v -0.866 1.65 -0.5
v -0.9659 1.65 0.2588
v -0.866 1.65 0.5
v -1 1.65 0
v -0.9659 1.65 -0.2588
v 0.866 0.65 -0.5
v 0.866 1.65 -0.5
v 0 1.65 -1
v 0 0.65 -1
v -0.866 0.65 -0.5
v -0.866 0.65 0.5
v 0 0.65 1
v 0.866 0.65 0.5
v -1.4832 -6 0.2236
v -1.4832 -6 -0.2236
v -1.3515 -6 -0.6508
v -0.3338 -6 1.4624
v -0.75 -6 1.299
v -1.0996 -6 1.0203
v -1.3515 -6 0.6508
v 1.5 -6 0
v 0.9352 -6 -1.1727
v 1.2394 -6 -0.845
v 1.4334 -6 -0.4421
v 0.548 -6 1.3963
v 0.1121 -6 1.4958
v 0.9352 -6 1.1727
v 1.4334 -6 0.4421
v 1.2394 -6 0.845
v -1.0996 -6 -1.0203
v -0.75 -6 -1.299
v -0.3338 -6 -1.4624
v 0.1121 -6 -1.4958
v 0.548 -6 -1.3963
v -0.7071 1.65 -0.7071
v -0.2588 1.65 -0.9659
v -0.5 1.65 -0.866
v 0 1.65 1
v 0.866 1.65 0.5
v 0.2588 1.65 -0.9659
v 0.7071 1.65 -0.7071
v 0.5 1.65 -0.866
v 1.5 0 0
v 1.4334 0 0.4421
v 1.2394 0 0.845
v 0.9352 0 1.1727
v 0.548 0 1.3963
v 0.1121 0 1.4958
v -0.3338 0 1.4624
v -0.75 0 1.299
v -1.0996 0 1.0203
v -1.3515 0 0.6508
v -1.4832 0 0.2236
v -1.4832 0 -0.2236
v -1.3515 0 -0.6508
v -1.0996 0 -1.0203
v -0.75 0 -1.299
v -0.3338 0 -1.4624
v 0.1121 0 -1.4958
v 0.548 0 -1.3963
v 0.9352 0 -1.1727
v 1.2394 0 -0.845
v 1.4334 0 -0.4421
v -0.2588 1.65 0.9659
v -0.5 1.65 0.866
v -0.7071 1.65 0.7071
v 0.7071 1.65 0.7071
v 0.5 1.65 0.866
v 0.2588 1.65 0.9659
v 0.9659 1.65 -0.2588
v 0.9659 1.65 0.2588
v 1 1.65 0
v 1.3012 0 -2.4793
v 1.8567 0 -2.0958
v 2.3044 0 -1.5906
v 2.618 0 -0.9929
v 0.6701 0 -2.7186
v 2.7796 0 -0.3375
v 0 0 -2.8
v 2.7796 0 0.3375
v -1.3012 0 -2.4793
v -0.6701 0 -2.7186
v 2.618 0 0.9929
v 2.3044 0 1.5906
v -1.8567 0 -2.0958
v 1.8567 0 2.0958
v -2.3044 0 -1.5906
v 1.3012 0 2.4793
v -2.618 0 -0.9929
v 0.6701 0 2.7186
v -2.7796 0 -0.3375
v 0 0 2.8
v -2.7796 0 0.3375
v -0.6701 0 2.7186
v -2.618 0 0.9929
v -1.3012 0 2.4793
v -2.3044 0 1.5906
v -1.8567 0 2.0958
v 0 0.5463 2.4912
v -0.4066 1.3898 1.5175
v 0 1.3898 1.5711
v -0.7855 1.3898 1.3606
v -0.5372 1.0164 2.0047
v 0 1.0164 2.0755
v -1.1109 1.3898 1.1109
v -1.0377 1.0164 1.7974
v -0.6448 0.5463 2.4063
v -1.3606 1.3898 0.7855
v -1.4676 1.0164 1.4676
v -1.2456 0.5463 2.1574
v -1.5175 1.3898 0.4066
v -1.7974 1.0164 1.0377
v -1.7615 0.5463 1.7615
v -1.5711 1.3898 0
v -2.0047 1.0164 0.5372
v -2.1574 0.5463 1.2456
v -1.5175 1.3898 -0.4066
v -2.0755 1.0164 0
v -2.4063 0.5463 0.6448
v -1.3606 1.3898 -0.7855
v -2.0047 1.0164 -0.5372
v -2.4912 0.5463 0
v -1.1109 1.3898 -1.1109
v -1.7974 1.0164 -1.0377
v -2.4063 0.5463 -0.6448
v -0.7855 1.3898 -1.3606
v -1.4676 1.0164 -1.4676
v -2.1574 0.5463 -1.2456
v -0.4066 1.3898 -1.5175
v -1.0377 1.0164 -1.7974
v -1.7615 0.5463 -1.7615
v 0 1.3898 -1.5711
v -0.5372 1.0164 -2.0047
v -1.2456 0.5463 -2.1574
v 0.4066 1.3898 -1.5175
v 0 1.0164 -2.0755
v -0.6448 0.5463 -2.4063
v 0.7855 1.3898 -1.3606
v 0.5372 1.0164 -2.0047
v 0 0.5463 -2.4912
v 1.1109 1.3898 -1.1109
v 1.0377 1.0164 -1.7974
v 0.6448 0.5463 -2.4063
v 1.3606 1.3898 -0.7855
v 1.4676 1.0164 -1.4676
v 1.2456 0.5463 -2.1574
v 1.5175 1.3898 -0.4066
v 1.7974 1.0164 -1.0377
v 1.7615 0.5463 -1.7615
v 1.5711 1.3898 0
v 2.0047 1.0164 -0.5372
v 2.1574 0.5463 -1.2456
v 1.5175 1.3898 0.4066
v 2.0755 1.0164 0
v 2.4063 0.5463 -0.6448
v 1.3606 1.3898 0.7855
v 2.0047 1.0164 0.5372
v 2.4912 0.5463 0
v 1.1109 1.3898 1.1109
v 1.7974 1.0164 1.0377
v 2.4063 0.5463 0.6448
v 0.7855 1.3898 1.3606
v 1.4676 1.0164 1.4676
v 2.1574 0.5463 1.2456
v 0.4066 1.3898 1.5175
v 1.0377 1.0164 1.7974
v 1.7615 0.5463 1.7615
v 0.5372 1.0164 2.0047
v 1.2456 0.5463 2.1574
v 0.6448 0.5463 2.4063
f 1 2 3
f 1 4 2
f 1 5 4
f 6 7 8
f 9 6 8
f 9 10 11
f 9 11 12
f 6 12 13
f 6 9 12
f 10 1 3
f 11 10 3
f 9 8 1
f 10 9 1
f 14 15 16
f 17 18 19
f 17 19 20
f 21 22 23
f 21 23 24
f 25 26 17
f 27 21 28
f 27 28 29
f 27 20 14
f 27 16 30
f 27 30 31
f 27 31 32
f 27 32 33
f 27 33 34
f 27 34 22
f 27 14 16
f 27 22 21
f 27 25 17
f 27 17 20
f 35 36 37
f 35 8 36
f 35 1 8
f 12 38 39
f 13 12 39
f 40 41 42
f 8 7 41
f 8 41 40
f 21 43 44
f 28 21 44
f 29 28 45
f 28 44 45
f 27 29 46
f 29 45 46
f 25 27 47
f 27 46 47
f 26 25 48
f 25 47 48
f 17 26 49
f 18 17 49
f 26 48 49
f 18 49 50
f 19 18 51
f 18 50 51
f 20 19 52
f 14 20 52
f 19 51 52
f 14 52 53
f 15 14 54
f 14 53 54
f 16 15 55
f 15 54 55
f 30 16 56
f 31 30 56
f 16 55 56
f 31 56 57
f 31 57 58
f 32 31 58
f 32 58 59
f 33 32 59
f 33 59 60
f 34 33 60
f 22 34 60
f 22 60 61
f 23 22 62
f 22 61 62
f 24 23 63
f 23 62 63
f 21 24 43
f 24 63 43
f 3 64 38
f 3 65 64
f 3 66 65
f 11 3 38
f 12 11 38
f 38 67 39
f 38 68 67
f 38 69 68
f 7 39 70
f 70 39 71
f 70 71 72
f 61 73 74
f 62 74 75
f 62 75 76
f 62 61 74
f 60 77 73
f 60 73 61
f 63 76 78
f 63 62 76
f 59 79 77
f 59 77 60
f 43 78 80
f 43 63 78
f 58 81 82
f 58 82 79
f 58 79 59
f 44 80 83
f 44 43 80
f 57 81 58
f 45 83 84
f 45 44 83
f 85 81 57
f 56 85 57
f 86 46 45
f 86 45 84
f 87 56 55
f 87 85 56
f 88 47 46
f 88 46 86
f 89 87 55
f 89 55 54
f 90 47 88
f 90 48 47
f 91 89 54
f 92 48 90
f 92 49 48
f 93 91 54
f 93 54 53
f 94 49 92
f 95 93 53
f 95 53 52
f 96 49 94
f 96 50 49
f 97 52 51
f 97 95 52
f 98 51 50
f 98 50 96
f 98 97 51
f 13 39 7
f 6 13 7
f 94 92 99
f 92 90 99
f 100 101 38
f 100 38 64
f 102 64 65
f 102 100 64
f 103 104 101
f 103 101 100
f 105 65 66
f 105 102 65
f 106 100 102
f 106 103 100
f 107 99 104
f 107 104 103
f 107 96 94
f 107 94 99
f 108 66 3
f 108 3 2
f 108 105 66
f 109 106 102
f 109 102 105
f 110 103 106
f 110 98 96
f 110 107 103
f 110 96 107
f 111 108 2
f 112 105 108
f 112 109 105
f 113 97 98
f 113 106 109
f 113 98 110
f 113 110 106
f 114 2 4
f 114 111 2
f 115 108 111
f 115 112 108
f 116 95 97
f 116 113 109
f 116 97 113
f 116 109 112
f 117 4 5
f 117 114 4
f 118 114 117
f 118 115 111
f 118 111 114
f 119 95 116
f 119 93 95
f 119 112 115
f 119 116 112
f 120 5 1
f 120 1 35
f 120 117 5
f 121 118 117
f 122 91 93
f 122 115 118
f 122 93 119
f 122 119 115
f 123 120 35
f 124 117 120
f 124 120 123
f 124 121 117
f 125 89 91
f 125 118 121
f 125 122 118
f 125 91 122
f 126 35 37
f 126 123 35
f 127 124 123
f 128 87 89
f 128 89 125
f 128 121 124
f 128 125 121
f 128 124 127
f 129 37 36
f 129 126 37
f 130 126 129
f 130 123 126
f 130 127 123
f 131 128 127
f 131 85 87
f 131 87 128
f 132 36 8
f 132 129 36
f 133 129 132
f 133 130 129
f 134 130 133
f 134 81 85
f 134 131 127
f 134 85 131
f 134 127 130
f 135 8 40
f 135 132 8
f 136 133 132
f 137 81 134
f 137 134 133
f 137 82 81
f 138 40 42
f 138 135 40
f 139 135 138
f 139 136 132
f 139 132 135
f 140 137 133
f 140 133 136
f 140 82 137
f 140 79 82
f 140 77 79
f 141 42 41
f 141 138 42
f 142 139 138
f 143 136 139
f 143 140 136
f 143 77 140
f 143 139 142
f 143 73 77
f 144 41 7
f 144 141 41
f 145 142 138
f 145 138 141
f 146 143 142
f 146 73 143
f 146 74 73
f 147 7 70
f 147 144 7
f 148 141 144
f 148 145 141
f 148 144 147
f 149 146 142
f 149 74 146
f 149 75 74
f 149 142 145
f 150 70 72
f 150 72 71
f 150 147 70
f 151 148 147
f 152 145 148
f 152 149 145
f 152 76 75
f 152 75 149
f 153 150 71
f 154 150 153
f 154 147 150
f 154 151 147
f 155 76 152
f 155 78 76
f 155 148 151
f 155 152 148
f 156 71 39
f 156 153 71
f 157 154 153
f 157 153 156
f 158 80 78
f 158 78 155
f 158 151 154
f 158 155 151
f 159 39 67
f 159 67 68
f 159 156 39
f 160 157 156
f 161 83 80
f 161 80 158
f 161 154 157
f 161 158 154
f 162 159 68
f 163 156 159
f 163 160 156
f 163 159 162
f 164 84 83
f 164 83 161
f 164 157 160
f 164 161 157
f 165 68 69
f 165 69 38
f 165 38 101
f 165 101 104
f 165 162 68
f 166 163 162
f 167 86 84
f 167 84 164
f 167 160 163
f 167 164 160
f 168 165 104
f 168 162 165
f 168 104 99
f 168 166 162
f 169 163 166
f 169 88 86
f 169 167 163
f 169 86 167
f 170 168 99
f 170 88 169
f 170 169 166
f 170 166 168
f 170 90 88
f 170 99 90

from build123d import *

# Parameters (mm, degrees)
SKETCH2_R           = 1.5
BOSS_EXTRUDE1_DEPTH = 6
CUT_EXTRUDE1_DEPTH  = 1


with BuildPart() as part:
    # Sketch1 → Revolve1 (revolve)
    with BuildSketch(Plane(origin=(0, 0, 0), x_dir=(0, 0, -1), z_dir=(1, 0, 0))):
        with BuildLine():
            Line((0, 0), (0, 1.65))
            Line((0, 1.65), (-1, 1.65))
            ThreePointArc((-1, 1.65), (-2.075469546, 1.016421323), (-2.8, 0))
            Line((-2.8, 0), (0, 0))
        make_face()
    revolve(axis=Axis((0, 4.725289413, 0), (0, -1, 0)))

    # Sketch2 → Boss-Extrude1 (add)
    with BuildSketch(Plane.XZ):
        Circle(SKETCH2_R)
    extrude(amount=BOSS_EXTRUDE1_DEPTH)

    # Sketch3 → Cut-Extrude1 (cut)
    with BuildSketch(Plane(origin=(0, 1.65, 0), x_dir=(1, 0, 0), z_dir=(0, 1, 0))):
        Polygon((0, 1), (-0.866025404, 0.5), (-0.866025404, -0.5), (0, -1), (0.866025404, -0.5), (0.866025404, 0.5), align=None)
    extrude(amount=-CUT_EXTRUDE1_DEPTH, mode=Mode.SUBTRACT)


solid = part.part
